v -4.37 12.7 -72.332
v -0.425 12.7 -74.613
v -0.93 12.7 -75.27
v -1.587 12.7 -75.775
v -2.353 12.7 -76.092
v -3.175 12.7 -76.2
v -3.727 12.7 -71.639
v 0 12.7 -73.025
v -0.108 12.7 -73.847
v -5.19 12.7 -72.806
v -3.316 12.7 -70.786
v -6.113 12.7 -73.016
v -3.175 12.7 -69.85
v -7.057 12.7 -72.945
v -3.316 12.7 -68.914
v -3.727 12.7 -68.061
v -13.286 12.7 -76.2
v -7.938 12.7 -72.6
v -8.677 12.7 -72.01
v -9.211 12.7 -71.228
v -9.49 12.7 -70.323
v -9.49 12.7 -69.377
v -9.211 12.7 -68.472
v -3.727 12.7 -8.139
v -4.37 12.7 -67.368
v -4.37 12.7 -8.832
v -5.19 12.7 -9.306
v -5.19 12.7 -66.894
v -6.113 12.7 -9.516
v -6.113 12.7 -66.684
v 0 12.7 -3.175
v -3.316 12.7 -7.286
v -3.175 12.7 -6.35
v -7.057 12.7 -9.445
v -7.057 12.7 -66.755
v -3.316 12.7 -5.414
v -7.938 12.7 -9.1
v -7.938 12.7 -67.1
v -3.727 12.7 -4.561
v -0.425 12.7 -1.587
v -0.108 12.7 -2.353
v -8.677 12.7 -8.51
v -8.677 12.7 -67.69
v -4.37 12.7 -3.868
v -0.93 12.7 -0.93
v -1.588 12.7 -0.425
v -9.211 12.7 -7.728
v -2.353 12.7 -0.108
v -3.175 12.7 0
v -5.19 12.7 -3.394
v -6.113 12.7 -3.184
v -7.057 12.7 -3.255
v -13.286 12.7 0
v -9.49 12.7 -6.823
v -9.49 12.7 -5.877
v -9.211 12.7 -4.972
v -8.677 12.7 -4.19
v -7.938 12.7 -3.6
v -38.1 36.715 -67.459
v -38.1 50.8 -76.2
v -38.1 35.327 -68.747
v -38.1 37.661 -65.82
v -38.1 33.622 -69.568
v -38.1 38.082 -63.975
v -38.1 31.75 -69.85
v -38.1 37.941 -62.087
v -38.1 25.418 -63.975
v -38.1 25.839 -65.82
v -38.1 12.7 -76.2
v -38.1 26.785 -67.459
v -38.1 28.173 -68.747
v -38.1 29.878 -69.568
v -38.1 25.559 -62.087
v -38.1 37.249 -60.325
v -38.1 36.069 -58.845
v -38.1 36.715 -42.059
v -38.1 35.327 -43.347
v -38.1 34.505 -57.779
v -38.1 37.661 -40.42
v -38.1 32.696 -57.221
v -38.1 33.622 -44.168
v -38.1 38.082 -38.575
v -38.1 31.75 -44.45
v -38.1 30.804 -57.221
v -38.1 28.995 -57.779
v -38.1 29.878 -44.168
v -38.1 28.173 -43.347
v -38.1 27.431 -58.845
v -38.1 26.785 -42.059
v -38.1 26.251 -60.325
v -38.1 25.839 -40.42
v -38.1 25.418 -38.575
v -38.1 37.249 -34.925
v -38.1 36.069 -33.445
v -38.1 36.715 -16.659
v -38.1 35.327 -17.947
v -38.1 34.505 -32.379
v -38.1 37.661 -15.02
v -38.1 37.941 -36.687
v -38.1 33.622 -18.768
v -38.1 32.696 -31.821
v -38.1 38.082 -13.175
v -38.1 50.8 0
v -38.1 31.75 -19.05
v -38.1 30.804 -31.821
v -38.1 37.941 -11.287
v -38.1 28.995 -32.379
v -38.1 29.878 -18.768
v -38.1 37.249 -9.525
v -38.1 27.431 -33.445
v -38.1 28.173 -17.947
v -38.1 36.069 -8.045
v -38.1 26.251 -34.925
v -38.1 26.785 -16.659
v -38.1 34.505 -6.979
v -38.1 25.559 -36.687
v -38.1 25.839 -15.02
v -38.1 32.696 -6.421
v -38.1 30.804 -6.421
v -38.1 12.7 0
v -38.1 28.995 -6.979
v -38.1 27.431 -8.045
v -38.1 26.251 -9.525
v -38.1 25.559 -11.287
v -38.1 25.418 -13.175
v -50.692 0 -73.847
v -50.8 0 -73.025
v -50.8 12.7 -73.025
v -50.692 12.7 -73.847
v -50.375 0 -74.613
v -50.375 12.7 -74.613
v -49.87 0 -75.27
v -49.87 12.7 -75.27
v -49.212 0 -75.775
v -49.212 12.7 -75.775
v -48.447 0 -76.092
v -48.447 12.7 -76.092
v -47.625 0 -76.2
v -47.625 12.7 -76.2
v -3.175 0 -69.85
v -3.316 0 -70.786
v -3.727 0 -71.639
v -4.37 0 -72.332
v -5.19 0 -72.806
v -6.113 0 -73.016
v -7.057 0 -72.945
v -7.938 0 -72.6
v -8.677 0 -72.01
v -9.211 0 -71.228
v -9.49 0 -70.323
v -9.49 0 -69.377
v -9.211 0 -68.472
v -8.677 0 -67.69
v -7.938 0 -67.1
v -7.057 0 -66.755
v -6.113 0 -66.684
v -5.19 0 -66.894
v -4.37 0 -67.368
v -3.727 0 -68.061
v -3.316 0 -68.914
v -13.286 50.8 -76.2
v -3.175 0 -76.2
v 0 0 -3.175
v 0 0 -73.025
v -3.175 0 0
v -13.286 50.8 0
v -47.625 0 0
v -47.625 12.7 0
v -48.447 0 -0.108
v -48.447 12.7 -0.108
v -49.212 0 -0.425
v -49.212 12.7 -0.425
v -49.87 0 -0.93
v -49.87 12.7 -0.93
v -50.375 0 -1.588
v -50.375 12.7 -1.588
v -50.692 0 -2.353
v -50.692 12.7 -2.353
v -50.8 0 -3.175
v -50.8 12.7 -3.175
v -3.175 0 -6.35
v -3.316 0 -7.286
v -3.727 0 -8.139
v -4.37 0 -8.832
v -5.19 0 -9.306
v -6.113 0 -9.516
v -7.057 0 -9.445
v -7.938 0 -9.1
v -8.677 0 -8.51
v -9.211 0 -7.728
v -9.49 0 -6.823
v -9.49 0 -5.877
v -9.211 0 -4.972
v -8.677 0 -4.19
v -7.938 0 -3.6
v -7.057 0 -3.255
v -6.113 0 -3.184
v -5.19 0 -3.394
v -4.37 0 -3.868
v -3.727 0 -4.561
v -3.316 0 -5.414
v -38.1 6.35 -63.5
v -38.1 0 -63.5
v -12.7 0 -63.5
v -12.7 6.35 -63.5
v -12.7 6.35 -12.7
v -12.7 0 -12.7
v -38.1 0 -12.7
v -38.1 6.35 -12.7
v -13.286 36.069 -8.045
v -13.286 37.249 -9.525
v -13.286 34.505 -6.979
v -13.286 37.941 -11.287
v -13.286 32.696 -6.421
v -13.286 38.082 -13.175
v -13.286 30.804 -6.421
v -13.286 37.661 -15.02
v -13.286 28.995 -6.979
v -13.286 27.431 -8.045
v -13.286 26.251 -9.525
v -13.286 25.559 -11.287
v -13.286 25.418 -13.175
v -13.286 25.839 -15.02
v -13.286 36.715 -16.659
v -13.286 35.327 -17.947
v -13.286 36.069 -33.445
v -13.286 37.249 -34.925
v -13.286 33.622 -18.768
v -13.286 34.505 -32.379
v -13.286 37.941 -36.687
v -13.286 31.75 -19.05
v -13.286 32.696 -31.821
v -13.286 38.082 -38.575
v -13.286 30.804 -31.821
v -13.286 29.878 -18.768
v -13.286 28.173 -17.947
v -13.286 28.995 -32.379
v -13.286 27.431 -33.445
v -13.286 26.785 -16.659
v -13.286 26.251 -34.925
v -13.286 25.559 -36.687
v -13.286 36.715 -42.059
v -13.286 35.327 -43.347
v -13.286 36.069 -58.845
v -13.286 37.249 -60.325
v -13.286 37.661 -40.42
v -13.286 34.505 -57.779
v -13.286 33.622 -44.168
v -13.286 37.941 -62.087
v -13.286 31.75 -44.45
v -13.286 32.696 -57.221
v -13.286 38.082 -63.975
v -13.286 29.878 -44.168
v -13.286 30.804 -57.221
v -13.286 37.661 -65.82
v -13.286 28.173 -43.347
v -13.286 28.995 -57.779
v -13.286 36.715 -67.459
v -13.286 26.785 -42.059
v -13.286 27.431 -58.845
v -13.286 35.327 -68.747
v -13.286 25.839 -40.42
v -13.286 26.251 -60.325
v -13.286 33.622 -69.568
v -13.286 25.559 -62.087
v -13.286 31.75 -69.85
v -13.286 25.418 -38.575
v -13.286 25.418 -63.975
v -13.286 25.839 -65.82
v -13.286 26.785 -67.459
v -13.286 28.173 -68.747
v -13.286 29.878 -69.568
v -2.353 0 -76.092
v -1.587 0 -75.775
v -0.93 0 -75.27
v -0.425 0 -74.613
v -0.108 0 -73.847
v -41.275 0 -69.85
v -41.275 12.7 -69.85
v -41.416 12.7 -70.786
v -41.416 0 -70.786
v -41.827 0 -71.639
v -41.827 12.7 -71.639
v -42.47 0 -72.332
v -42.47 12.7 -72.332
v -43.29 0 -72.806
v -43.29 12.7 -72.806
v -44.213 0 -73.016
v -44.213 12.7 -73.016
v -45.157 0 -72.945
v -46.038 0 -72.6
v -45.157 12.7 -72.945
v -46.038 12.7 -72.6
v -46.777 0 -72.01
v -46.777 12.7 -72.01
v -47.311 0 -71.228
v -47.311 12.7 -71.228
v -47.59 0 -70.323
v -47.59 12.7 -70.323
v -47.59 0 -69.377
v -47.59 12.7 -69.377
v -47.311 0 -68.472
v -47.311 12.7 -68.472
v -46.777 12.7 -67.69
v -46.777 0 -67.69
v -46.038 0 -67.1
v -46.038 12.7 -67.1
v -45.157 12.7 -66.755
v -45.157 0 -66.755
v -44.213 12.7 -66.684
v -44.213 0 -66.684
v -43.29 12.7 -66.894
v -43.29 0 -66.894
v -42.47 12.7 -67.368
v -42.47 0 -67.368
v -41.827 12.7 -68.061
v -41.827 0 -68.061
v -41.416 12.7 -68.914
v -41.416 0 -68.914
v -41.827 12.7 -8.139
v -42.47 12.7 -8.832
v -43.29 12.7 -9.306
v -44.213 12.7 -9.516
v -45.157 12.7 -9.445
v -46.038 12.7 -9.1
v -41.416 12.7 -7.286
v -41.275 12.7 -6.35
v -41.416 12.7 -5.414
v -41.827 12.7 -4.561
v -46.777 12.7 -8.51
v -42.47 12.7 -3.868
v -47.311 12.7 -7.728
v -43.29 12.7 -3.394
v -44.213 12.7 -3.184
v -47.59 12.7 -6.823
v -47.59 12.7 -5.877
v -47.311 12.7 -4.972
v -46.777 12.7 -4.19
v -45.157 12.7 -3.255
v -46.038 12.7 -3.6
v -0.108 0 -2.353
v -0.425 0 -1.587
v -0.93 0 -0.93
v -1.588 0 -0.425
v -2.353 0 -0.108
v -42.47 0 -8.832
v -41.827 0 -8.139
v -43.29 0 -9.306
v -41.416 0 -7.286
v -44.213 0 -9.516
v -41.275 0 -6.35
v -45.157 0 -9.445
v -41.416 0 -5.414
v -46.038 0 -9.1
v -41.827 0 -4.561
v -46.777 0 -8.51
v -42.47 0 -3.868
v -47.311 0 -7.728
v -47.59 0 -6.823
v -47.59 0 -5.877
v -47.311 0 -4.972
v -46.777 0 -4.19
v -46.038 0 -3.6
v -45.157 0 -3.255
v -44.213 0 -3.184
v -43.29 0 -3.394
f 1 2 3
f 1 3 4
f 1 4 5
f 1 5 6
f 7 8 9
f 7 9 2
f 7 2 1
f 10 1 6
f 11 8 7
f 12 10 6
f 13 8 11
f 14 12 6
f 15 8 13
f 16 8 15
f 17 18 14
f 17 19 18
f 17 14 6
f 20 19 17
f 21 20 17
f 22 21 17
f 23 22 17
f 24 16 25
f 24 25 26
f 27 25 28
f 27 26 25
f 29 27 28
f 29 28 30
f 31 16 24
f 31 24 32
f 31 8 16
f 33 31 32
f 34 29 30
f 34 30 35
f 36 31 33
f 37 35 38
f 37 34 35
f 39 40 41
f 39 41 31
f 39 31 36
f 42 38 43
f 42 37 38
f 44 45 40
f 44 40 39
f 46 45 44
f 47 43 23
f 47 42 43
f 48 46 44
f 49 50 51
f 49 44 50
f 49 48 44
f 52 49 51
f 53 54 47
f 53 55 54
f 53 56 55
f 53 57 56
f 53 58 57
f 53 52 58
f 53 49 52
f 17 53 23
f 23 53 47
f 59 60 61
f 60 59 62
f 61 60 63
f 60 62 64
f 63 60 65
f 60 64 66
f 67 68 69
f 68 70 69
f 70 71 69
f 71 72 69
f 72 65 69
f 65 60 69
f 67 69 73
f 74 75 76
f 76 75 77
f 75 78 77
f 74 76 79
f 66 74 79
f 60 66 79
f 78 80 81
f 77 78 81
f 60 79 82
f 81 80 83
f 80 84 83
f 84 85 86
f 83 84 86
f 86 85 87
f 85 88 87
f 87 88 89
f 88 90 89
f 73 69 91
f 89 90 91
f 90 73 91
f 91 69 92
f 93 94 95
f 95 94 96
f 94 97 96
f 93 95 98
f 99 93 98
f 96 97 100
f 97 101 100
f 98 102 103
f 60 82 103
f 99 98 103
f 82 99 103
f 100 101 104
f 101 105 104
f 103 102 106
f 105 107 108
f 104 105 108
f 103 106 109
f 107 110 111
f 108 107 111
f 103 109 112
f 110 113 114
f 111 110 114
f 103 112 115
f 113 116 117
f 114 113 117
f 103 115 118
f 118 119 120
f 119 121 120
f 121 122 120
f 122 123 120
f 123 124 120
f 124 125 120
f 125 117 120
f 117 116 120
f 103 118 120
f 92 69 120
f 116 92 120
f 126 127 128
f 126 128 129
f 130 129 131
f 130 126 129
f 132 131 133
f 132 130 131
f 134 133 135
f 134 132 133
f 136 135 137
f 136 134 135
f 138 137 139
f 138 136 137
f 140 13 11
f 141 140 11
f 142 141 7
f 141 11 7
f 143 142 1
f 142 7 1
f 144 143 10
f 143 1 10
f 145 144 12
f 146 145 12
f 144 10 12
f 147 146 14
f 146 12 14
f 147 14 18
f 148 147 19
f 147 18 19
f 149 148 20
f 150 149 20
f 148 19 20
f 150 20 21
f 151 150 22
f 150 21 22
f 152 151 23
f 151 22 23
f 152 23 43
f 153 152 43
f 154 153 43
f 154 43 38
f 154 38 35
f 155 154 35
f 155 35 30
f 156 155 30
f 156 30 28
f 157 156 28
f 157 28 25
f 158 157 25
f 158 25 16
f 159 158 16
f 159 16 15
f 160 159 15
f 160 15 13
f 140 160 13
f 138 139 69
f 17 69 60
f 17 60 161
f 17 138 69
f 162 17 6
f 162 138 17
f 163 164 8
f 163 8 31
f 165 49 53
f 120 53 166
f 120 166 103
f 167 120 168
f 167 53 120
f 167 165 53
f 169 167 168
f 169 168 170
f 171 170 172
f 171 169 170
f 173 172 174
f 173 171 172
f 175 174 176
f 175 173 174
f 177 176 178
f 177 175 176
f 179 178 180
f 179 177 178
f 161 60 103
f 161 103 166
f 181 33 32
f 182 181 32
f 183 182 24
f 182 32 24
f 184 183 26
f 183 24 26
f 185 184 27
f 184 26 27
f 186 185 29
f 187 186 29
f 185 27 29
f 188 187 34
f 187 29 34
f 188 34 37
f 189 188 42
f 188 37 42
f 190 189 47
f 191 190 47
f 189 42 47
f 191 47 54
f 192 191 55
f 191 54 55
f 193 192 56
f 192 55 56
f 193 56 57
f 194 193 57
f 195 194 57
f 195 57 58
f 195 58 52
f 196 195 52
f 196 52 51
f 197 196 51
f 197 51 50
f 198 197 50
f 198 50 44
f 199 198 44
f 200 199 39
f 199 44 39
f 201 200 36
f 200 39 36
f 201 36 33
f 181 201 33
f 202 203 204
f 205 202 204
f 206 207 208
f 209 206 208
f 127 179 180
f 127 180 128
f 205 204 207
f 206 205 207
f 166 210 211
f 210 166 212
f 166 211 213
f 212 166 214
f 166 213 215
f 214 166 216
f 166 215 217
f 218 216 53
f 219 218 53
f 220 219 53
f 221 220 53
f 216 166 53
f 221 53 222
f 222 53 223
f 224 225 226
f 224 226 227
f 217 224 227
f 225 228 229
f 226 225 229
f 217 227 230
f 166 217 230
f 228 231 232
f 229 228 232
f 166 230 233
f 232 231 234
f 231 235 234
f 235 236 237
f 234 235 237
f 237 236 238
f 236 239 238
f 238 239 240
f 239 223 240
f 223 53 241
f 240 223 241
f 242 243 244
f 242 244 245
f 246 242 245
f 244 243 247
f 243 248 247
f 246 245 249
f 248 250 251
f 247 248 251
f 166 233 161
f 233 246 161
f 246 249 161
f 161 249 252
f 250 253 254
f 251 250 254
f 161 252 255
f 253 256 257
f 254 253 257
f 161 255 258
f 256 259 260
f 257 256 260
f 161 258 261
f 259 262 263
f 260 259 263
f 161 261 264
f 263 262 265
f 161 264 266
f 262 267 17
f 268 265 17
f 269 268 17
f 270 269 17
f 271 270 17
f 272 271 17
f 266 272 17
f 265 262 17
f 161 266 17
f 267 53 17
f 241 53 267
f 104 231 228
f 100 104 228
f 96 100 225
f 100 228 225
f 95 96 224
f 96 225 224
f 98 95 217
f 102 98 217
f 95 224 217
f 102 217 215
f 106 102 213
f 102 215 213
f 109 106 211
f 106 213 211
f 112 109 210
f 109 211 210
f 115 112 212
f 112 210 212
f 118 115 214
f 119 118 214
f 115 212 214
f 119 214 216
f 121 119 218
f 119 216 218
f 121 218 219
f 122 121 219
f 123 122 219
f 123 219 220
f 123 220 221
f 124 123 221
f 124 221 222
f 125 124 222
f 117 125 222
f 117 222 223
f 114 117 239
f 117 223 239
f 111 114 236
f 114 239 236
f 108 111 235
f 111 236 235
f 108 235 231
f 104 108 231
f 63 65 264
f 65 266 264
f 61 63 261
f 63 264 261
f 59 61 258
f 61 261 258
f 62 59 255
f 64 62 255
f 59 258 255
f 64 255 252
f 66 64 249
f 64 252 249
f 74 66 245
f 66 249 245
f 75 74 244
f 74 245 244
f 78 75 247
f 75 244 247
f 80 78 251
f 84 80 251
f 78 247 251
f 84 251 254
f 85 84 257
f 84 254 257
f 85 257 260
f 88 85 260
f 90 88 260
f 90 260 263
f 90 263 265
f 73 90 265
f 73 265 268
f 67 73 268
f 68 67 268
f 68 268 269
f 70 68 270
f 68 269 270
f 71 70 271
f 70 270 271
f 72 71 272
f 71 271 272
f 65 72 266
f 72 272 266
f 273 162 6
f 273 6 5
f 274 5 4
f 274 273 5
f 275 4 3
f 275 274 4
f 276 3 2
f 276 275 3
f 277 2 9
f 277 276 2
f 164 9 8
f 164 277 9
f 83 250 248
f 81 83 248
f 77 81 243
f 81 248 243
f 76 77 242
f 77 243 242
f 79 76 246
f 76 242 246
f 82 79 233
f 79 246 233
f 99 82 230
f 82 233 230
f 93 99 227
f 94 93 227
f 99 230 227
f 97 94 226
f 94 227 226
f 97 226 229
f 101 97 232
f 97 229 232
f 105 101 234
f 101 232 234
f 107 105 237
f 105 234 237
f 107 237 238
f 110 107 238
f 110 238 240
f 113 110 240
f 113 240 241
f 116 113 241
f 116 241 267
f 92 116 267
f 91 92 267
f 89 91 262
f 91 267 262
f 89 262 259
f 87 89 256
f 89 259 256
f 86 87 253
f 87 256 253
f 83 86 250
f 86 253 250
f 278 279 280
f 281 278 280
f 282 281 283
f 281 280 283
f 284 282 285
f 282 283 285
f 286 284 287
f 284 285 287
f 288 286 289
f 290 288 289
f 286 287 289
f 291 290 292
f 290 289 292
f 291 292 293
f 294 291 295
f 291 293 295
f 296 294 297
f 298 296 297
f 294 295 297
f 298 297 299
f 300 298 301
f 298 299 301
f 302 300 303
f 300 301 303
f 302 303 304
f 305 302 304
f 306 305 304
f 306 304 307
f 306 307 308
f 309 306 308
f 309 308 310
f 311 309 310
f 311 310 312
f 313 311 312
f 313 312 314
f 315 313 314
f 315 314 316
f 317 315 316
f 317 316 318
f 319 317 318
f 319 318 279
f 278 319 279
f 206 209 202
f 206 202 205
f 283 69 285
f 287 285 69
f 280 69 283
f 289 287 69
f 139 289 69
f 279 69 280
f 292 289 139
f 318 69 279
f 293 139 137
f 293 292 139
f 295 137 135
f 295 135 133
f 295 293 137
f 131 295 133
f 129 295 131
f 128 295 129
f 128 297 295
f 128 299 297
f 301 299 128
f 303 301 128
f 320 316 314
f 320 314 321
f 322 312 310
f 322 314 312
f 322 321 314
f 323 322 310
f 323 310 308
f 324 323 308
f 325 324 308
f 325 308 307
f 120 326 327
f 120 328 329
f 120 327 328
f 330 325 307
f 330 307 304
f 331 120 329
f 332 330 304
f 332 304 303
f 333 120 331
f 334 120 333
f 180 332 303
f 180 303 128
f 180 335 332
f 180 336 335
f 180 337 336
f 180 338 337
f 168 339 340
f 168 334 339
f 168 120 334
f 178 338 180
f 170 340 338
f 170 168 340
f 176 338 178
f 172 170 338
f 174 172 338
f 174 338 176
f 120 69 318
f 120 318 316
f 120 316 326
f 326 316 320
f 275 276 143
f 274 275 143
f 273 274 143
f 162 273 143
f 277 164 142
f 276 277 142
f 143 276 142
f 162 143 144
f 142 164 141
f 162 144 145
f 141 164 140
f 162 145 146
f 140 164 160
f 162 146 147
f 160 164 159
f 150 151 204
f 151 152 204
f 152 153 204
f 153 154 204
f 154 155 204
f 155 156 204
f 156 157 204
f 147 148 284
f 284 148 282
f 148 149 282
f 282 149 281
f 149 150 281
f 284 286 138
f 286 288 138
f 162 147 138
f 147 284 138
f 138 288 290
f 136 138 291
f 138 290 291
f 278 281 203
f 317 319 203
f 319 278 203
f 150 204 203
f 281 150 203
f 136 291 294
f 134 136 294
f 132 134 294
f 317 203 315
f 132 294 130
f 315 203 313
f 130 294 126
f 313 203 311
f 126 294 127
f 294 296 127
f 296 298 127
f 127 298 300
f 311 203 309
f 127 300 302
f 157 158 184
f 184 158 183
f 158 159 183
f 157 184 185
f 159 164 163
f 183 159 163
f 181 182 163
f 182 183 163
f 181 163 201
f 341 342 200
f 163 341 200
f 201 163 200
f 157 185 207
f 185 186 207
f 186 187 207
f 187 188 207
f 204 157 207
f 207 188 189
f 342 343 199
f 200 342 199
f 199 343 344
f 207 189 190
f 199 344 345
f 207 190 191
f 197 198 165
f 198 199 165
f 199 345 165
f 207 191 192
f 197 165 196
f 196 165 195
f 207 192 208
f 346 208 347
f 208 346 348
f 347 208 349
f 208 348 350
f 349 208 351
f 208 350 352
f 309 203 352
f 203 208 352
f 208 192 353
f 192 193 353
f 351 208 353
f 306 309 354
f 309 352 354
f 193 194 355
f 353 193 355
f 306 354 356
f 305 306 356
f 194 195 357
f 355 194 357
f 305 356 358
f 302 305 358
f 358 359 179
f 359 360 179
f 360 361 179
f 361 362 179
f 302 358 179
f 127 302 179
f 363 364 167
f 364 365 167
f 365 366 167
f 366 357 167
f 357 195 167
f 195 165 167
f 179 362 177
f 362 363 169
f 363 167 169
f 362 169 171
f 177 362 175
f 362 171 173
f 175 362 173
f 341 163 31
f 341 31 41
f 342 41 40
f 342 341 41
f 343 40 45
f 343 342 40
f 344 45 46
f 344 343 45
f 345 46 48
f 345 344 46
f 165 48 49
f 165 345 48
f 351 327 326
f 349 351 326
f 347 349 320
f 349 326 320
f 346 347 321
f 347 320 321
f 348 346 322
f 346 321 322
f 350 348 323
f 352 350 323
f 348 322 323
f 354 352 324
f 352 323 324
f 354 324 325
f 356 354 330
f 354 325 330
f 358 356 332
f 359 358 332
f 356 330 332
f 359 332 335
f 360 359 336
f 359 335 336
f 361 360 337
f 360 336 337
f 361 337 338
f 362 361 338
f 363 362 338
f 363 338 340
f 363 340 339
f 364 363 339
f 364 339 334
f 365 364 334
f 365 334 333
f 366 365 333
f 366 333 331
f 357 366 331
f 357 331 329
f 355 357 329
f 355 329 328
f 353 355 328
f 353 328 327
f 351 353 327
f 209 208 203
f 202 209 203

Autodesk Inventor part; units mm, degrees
ref_plane "YZ Plane" through (0, 0, 0) normal (1, 0, 0) x (0, 1, 0)
ref_plane "XZ Plane" through (0, 0, 0) normal (0, 1, 0) x (-1, 0, 0)
ref_plane "XY Plane" through (0, 0, 0) normal (0, 0, 1) x (1, 0, 0)
sketch "Sketch1" plane through (0, 0, 0) normal (0, 1, 0) x (-1, 0, 0)
  line L0 (3.175, 0) -> (47.625, 0)
  line L1 (50.8, -3.175) -> (50.8, -73.025)
  line L2 (47.625, -76.2) -> (3.175, -76.2)
  line L3 (0, -73.025) -> (0, -3.175)
  arc A0 (50.8, -3.175) -> (47.625, 0) centre (47.625, -3.175) ccw
  arc A1 (3.175, 0) -> (0, -3.175) centre (3.175, -3.175) ccw
  arc A2 (0, -73.025) -> (3.175, -76.2) centre (3.175, -73.025) ccw
  arc A3 (47.625, -76.2) -> (50.8, -73.025) centre (47.625, -73.025) ccw
  point P0 (0, 0)
  point P1 (50.8, -76.2)
  point P2 (50.8, 0)
  point P3 (0, -76.2)
  dimension "d0" = 50.8
  dimension "d1" = 76.2
  dimension "d4" = 3.175
extrude "Extrusion1" add sketch "Sketch1" along normal blind 12.7
sketch "Sketch2" plane through (0, 12.7, 0) normal (0, 1, 0) x (1, 0, 0)
  line L0 (0, 0) -> (-6.35, 0) construction
  line L1 (-6.35, 0) -> (-6.35, 6.35) construction
  line L2 (-6.35, 6.35) -> (0, 6.35) construction
  line L3 (0, 6.35) -> (0, 0) construction
  circle A0 centre (-6.35, 6.35) radius 3.175
  line L4 (0, 3.175) -> (0, 73.025) construction
  line L5 (0, 38.1) -> (-50.8802, 38.1) construction
  line L6 (-50.8802, 38.1) -> (-25.4, 76.2) construction
  line L7 (-3.175, 76.2) -> (-47.625, 76.2) construction
  line L8 (-25.4, 76.2) -> (-25.4, 0) construction
  line L9 (-47.625, 0) -> (-3.175, 0) construction
  circle A1 centre (-6.35, 69.85) radius 3.175
  circle A2 centre (-44.45, 6.35) radius 3.175
  circle A3 centre (-44.45, 69.85) radius 3.175
  dimension "d5" = 6.35
  dimension "d6" = 6.35
  dimension "d7" = 6.35
extrude "Extrusion2" cut sketch "Sketch2" against normal through all
sketch "Sketch3" plane through (0, 12.7, 0) normal (0, 1, 0) x (1, 0, 0)
  line L0 (0, 0) -> (-12.7, 0) construction
  line L1 (0, 0) -> (12.7, 0) construction
  line L2 (-47.625, 0) -> (-3.175, 0) construction
  line L3 (-25.4, 0) -> (-25.4, 76.2) construction
  line L4 (-3.175, 76.2) -> (-47.625, 76.2) construction
  line L5 (-50.8, 0) -> (-38.1, 0) construction
  line L6 (-38.1, 0) -> (-13.2855, 0)
  line L7 (-13.2855, 0) -> (-13.2855, 76.2)
  line L8 (-13.2855, 76.2) -> (-38.1, 76.2)
  line L9 (-38.1, 76.2) -> (-38.1, 0)
  dimension "d14" = 12.7
  dimension "d15" = 180
extrude "Extrusion3" add sketch "Sketch3" along normal blind 38.1
sketch "Sketch4" plane through (0, 0, 0) normal (0, -1, 0) x (1, 0, 0)
  line L0 (0, 0) -> (-12.7, 0) construction
  line L1 (-12.7, 0) -> (-12.7, -12.7) construction
  line L2 (-12.7, -12.7) -> (0, -12.7) construction
  line L3 (0, -12.7) -> (0, 0) construction
  line L4 (-50.8, -76.2) -> (-38.1, -76.2) construction
  line L5 (-38.1, -76.2) -> (-38.1, -63.5) construction
  line L6 (-38.1, -63.5) -> (-50.8, -63.5) construction
  line L7 (-50.8, -63.5) -> (-50.8, -76.2) construction
  line L8 (-12.7, -12.7) -> (-38.1, -12.7)
  line L9 (-38.1, -12.7) -> (-38.1, -63.5)
  line L10 (-38.1, -63.5) -> (-12.7, -63.5)
  line L11 (-12.7, -63.5) -> (-12.7, -12.7)
  dimension "d18" = 12.7
  dimension "d19" = 12.7
  dimension "d20" = 12.7
  dimension "d21" = 12.7
extrude "Extrusion4" cut sketch "Sketch4" against normal blind 6.35
sketch "Sketch5" plane through (-13.2855, 12.7, 0) normal (1, 0, 0) x (0, 0, -1)
  line L0 (0, 38.1) -> (76.2, 38.1) construction
  line L1 (38.1, 38.1) -> (38.1, 0) construction
  line L2 (73.025, 0) -> (3.175, 0) construction
  line L3 (76.2, 0) -> (76.2, 38.1) construction
  line L4 (76.2, 19.05) -> (0, 19.05) construction
  circle A0 centre (38.1, 19.05) radius 6.35
  line L5 (38.1, 19.05) -> (12.7, 19.05)
  line L6 (38.1, 19.05) -> (63.5, 19.05) construction
  circle A1 centre (12.7, 19.05) radius 6.35
  circle A2 centre (63.5, 19.05) radius 6.35
  point P0 (0, -12.7)
  dimension "d24" = 12.7
  dimension "d25" = 25.4
  dimension "d26" = 180
  dimension "d27" = 12.7
extrude "Extrusion5" cut sketch "Sketch5" against normal through all
properties part number "Near Gantry Bracket"
